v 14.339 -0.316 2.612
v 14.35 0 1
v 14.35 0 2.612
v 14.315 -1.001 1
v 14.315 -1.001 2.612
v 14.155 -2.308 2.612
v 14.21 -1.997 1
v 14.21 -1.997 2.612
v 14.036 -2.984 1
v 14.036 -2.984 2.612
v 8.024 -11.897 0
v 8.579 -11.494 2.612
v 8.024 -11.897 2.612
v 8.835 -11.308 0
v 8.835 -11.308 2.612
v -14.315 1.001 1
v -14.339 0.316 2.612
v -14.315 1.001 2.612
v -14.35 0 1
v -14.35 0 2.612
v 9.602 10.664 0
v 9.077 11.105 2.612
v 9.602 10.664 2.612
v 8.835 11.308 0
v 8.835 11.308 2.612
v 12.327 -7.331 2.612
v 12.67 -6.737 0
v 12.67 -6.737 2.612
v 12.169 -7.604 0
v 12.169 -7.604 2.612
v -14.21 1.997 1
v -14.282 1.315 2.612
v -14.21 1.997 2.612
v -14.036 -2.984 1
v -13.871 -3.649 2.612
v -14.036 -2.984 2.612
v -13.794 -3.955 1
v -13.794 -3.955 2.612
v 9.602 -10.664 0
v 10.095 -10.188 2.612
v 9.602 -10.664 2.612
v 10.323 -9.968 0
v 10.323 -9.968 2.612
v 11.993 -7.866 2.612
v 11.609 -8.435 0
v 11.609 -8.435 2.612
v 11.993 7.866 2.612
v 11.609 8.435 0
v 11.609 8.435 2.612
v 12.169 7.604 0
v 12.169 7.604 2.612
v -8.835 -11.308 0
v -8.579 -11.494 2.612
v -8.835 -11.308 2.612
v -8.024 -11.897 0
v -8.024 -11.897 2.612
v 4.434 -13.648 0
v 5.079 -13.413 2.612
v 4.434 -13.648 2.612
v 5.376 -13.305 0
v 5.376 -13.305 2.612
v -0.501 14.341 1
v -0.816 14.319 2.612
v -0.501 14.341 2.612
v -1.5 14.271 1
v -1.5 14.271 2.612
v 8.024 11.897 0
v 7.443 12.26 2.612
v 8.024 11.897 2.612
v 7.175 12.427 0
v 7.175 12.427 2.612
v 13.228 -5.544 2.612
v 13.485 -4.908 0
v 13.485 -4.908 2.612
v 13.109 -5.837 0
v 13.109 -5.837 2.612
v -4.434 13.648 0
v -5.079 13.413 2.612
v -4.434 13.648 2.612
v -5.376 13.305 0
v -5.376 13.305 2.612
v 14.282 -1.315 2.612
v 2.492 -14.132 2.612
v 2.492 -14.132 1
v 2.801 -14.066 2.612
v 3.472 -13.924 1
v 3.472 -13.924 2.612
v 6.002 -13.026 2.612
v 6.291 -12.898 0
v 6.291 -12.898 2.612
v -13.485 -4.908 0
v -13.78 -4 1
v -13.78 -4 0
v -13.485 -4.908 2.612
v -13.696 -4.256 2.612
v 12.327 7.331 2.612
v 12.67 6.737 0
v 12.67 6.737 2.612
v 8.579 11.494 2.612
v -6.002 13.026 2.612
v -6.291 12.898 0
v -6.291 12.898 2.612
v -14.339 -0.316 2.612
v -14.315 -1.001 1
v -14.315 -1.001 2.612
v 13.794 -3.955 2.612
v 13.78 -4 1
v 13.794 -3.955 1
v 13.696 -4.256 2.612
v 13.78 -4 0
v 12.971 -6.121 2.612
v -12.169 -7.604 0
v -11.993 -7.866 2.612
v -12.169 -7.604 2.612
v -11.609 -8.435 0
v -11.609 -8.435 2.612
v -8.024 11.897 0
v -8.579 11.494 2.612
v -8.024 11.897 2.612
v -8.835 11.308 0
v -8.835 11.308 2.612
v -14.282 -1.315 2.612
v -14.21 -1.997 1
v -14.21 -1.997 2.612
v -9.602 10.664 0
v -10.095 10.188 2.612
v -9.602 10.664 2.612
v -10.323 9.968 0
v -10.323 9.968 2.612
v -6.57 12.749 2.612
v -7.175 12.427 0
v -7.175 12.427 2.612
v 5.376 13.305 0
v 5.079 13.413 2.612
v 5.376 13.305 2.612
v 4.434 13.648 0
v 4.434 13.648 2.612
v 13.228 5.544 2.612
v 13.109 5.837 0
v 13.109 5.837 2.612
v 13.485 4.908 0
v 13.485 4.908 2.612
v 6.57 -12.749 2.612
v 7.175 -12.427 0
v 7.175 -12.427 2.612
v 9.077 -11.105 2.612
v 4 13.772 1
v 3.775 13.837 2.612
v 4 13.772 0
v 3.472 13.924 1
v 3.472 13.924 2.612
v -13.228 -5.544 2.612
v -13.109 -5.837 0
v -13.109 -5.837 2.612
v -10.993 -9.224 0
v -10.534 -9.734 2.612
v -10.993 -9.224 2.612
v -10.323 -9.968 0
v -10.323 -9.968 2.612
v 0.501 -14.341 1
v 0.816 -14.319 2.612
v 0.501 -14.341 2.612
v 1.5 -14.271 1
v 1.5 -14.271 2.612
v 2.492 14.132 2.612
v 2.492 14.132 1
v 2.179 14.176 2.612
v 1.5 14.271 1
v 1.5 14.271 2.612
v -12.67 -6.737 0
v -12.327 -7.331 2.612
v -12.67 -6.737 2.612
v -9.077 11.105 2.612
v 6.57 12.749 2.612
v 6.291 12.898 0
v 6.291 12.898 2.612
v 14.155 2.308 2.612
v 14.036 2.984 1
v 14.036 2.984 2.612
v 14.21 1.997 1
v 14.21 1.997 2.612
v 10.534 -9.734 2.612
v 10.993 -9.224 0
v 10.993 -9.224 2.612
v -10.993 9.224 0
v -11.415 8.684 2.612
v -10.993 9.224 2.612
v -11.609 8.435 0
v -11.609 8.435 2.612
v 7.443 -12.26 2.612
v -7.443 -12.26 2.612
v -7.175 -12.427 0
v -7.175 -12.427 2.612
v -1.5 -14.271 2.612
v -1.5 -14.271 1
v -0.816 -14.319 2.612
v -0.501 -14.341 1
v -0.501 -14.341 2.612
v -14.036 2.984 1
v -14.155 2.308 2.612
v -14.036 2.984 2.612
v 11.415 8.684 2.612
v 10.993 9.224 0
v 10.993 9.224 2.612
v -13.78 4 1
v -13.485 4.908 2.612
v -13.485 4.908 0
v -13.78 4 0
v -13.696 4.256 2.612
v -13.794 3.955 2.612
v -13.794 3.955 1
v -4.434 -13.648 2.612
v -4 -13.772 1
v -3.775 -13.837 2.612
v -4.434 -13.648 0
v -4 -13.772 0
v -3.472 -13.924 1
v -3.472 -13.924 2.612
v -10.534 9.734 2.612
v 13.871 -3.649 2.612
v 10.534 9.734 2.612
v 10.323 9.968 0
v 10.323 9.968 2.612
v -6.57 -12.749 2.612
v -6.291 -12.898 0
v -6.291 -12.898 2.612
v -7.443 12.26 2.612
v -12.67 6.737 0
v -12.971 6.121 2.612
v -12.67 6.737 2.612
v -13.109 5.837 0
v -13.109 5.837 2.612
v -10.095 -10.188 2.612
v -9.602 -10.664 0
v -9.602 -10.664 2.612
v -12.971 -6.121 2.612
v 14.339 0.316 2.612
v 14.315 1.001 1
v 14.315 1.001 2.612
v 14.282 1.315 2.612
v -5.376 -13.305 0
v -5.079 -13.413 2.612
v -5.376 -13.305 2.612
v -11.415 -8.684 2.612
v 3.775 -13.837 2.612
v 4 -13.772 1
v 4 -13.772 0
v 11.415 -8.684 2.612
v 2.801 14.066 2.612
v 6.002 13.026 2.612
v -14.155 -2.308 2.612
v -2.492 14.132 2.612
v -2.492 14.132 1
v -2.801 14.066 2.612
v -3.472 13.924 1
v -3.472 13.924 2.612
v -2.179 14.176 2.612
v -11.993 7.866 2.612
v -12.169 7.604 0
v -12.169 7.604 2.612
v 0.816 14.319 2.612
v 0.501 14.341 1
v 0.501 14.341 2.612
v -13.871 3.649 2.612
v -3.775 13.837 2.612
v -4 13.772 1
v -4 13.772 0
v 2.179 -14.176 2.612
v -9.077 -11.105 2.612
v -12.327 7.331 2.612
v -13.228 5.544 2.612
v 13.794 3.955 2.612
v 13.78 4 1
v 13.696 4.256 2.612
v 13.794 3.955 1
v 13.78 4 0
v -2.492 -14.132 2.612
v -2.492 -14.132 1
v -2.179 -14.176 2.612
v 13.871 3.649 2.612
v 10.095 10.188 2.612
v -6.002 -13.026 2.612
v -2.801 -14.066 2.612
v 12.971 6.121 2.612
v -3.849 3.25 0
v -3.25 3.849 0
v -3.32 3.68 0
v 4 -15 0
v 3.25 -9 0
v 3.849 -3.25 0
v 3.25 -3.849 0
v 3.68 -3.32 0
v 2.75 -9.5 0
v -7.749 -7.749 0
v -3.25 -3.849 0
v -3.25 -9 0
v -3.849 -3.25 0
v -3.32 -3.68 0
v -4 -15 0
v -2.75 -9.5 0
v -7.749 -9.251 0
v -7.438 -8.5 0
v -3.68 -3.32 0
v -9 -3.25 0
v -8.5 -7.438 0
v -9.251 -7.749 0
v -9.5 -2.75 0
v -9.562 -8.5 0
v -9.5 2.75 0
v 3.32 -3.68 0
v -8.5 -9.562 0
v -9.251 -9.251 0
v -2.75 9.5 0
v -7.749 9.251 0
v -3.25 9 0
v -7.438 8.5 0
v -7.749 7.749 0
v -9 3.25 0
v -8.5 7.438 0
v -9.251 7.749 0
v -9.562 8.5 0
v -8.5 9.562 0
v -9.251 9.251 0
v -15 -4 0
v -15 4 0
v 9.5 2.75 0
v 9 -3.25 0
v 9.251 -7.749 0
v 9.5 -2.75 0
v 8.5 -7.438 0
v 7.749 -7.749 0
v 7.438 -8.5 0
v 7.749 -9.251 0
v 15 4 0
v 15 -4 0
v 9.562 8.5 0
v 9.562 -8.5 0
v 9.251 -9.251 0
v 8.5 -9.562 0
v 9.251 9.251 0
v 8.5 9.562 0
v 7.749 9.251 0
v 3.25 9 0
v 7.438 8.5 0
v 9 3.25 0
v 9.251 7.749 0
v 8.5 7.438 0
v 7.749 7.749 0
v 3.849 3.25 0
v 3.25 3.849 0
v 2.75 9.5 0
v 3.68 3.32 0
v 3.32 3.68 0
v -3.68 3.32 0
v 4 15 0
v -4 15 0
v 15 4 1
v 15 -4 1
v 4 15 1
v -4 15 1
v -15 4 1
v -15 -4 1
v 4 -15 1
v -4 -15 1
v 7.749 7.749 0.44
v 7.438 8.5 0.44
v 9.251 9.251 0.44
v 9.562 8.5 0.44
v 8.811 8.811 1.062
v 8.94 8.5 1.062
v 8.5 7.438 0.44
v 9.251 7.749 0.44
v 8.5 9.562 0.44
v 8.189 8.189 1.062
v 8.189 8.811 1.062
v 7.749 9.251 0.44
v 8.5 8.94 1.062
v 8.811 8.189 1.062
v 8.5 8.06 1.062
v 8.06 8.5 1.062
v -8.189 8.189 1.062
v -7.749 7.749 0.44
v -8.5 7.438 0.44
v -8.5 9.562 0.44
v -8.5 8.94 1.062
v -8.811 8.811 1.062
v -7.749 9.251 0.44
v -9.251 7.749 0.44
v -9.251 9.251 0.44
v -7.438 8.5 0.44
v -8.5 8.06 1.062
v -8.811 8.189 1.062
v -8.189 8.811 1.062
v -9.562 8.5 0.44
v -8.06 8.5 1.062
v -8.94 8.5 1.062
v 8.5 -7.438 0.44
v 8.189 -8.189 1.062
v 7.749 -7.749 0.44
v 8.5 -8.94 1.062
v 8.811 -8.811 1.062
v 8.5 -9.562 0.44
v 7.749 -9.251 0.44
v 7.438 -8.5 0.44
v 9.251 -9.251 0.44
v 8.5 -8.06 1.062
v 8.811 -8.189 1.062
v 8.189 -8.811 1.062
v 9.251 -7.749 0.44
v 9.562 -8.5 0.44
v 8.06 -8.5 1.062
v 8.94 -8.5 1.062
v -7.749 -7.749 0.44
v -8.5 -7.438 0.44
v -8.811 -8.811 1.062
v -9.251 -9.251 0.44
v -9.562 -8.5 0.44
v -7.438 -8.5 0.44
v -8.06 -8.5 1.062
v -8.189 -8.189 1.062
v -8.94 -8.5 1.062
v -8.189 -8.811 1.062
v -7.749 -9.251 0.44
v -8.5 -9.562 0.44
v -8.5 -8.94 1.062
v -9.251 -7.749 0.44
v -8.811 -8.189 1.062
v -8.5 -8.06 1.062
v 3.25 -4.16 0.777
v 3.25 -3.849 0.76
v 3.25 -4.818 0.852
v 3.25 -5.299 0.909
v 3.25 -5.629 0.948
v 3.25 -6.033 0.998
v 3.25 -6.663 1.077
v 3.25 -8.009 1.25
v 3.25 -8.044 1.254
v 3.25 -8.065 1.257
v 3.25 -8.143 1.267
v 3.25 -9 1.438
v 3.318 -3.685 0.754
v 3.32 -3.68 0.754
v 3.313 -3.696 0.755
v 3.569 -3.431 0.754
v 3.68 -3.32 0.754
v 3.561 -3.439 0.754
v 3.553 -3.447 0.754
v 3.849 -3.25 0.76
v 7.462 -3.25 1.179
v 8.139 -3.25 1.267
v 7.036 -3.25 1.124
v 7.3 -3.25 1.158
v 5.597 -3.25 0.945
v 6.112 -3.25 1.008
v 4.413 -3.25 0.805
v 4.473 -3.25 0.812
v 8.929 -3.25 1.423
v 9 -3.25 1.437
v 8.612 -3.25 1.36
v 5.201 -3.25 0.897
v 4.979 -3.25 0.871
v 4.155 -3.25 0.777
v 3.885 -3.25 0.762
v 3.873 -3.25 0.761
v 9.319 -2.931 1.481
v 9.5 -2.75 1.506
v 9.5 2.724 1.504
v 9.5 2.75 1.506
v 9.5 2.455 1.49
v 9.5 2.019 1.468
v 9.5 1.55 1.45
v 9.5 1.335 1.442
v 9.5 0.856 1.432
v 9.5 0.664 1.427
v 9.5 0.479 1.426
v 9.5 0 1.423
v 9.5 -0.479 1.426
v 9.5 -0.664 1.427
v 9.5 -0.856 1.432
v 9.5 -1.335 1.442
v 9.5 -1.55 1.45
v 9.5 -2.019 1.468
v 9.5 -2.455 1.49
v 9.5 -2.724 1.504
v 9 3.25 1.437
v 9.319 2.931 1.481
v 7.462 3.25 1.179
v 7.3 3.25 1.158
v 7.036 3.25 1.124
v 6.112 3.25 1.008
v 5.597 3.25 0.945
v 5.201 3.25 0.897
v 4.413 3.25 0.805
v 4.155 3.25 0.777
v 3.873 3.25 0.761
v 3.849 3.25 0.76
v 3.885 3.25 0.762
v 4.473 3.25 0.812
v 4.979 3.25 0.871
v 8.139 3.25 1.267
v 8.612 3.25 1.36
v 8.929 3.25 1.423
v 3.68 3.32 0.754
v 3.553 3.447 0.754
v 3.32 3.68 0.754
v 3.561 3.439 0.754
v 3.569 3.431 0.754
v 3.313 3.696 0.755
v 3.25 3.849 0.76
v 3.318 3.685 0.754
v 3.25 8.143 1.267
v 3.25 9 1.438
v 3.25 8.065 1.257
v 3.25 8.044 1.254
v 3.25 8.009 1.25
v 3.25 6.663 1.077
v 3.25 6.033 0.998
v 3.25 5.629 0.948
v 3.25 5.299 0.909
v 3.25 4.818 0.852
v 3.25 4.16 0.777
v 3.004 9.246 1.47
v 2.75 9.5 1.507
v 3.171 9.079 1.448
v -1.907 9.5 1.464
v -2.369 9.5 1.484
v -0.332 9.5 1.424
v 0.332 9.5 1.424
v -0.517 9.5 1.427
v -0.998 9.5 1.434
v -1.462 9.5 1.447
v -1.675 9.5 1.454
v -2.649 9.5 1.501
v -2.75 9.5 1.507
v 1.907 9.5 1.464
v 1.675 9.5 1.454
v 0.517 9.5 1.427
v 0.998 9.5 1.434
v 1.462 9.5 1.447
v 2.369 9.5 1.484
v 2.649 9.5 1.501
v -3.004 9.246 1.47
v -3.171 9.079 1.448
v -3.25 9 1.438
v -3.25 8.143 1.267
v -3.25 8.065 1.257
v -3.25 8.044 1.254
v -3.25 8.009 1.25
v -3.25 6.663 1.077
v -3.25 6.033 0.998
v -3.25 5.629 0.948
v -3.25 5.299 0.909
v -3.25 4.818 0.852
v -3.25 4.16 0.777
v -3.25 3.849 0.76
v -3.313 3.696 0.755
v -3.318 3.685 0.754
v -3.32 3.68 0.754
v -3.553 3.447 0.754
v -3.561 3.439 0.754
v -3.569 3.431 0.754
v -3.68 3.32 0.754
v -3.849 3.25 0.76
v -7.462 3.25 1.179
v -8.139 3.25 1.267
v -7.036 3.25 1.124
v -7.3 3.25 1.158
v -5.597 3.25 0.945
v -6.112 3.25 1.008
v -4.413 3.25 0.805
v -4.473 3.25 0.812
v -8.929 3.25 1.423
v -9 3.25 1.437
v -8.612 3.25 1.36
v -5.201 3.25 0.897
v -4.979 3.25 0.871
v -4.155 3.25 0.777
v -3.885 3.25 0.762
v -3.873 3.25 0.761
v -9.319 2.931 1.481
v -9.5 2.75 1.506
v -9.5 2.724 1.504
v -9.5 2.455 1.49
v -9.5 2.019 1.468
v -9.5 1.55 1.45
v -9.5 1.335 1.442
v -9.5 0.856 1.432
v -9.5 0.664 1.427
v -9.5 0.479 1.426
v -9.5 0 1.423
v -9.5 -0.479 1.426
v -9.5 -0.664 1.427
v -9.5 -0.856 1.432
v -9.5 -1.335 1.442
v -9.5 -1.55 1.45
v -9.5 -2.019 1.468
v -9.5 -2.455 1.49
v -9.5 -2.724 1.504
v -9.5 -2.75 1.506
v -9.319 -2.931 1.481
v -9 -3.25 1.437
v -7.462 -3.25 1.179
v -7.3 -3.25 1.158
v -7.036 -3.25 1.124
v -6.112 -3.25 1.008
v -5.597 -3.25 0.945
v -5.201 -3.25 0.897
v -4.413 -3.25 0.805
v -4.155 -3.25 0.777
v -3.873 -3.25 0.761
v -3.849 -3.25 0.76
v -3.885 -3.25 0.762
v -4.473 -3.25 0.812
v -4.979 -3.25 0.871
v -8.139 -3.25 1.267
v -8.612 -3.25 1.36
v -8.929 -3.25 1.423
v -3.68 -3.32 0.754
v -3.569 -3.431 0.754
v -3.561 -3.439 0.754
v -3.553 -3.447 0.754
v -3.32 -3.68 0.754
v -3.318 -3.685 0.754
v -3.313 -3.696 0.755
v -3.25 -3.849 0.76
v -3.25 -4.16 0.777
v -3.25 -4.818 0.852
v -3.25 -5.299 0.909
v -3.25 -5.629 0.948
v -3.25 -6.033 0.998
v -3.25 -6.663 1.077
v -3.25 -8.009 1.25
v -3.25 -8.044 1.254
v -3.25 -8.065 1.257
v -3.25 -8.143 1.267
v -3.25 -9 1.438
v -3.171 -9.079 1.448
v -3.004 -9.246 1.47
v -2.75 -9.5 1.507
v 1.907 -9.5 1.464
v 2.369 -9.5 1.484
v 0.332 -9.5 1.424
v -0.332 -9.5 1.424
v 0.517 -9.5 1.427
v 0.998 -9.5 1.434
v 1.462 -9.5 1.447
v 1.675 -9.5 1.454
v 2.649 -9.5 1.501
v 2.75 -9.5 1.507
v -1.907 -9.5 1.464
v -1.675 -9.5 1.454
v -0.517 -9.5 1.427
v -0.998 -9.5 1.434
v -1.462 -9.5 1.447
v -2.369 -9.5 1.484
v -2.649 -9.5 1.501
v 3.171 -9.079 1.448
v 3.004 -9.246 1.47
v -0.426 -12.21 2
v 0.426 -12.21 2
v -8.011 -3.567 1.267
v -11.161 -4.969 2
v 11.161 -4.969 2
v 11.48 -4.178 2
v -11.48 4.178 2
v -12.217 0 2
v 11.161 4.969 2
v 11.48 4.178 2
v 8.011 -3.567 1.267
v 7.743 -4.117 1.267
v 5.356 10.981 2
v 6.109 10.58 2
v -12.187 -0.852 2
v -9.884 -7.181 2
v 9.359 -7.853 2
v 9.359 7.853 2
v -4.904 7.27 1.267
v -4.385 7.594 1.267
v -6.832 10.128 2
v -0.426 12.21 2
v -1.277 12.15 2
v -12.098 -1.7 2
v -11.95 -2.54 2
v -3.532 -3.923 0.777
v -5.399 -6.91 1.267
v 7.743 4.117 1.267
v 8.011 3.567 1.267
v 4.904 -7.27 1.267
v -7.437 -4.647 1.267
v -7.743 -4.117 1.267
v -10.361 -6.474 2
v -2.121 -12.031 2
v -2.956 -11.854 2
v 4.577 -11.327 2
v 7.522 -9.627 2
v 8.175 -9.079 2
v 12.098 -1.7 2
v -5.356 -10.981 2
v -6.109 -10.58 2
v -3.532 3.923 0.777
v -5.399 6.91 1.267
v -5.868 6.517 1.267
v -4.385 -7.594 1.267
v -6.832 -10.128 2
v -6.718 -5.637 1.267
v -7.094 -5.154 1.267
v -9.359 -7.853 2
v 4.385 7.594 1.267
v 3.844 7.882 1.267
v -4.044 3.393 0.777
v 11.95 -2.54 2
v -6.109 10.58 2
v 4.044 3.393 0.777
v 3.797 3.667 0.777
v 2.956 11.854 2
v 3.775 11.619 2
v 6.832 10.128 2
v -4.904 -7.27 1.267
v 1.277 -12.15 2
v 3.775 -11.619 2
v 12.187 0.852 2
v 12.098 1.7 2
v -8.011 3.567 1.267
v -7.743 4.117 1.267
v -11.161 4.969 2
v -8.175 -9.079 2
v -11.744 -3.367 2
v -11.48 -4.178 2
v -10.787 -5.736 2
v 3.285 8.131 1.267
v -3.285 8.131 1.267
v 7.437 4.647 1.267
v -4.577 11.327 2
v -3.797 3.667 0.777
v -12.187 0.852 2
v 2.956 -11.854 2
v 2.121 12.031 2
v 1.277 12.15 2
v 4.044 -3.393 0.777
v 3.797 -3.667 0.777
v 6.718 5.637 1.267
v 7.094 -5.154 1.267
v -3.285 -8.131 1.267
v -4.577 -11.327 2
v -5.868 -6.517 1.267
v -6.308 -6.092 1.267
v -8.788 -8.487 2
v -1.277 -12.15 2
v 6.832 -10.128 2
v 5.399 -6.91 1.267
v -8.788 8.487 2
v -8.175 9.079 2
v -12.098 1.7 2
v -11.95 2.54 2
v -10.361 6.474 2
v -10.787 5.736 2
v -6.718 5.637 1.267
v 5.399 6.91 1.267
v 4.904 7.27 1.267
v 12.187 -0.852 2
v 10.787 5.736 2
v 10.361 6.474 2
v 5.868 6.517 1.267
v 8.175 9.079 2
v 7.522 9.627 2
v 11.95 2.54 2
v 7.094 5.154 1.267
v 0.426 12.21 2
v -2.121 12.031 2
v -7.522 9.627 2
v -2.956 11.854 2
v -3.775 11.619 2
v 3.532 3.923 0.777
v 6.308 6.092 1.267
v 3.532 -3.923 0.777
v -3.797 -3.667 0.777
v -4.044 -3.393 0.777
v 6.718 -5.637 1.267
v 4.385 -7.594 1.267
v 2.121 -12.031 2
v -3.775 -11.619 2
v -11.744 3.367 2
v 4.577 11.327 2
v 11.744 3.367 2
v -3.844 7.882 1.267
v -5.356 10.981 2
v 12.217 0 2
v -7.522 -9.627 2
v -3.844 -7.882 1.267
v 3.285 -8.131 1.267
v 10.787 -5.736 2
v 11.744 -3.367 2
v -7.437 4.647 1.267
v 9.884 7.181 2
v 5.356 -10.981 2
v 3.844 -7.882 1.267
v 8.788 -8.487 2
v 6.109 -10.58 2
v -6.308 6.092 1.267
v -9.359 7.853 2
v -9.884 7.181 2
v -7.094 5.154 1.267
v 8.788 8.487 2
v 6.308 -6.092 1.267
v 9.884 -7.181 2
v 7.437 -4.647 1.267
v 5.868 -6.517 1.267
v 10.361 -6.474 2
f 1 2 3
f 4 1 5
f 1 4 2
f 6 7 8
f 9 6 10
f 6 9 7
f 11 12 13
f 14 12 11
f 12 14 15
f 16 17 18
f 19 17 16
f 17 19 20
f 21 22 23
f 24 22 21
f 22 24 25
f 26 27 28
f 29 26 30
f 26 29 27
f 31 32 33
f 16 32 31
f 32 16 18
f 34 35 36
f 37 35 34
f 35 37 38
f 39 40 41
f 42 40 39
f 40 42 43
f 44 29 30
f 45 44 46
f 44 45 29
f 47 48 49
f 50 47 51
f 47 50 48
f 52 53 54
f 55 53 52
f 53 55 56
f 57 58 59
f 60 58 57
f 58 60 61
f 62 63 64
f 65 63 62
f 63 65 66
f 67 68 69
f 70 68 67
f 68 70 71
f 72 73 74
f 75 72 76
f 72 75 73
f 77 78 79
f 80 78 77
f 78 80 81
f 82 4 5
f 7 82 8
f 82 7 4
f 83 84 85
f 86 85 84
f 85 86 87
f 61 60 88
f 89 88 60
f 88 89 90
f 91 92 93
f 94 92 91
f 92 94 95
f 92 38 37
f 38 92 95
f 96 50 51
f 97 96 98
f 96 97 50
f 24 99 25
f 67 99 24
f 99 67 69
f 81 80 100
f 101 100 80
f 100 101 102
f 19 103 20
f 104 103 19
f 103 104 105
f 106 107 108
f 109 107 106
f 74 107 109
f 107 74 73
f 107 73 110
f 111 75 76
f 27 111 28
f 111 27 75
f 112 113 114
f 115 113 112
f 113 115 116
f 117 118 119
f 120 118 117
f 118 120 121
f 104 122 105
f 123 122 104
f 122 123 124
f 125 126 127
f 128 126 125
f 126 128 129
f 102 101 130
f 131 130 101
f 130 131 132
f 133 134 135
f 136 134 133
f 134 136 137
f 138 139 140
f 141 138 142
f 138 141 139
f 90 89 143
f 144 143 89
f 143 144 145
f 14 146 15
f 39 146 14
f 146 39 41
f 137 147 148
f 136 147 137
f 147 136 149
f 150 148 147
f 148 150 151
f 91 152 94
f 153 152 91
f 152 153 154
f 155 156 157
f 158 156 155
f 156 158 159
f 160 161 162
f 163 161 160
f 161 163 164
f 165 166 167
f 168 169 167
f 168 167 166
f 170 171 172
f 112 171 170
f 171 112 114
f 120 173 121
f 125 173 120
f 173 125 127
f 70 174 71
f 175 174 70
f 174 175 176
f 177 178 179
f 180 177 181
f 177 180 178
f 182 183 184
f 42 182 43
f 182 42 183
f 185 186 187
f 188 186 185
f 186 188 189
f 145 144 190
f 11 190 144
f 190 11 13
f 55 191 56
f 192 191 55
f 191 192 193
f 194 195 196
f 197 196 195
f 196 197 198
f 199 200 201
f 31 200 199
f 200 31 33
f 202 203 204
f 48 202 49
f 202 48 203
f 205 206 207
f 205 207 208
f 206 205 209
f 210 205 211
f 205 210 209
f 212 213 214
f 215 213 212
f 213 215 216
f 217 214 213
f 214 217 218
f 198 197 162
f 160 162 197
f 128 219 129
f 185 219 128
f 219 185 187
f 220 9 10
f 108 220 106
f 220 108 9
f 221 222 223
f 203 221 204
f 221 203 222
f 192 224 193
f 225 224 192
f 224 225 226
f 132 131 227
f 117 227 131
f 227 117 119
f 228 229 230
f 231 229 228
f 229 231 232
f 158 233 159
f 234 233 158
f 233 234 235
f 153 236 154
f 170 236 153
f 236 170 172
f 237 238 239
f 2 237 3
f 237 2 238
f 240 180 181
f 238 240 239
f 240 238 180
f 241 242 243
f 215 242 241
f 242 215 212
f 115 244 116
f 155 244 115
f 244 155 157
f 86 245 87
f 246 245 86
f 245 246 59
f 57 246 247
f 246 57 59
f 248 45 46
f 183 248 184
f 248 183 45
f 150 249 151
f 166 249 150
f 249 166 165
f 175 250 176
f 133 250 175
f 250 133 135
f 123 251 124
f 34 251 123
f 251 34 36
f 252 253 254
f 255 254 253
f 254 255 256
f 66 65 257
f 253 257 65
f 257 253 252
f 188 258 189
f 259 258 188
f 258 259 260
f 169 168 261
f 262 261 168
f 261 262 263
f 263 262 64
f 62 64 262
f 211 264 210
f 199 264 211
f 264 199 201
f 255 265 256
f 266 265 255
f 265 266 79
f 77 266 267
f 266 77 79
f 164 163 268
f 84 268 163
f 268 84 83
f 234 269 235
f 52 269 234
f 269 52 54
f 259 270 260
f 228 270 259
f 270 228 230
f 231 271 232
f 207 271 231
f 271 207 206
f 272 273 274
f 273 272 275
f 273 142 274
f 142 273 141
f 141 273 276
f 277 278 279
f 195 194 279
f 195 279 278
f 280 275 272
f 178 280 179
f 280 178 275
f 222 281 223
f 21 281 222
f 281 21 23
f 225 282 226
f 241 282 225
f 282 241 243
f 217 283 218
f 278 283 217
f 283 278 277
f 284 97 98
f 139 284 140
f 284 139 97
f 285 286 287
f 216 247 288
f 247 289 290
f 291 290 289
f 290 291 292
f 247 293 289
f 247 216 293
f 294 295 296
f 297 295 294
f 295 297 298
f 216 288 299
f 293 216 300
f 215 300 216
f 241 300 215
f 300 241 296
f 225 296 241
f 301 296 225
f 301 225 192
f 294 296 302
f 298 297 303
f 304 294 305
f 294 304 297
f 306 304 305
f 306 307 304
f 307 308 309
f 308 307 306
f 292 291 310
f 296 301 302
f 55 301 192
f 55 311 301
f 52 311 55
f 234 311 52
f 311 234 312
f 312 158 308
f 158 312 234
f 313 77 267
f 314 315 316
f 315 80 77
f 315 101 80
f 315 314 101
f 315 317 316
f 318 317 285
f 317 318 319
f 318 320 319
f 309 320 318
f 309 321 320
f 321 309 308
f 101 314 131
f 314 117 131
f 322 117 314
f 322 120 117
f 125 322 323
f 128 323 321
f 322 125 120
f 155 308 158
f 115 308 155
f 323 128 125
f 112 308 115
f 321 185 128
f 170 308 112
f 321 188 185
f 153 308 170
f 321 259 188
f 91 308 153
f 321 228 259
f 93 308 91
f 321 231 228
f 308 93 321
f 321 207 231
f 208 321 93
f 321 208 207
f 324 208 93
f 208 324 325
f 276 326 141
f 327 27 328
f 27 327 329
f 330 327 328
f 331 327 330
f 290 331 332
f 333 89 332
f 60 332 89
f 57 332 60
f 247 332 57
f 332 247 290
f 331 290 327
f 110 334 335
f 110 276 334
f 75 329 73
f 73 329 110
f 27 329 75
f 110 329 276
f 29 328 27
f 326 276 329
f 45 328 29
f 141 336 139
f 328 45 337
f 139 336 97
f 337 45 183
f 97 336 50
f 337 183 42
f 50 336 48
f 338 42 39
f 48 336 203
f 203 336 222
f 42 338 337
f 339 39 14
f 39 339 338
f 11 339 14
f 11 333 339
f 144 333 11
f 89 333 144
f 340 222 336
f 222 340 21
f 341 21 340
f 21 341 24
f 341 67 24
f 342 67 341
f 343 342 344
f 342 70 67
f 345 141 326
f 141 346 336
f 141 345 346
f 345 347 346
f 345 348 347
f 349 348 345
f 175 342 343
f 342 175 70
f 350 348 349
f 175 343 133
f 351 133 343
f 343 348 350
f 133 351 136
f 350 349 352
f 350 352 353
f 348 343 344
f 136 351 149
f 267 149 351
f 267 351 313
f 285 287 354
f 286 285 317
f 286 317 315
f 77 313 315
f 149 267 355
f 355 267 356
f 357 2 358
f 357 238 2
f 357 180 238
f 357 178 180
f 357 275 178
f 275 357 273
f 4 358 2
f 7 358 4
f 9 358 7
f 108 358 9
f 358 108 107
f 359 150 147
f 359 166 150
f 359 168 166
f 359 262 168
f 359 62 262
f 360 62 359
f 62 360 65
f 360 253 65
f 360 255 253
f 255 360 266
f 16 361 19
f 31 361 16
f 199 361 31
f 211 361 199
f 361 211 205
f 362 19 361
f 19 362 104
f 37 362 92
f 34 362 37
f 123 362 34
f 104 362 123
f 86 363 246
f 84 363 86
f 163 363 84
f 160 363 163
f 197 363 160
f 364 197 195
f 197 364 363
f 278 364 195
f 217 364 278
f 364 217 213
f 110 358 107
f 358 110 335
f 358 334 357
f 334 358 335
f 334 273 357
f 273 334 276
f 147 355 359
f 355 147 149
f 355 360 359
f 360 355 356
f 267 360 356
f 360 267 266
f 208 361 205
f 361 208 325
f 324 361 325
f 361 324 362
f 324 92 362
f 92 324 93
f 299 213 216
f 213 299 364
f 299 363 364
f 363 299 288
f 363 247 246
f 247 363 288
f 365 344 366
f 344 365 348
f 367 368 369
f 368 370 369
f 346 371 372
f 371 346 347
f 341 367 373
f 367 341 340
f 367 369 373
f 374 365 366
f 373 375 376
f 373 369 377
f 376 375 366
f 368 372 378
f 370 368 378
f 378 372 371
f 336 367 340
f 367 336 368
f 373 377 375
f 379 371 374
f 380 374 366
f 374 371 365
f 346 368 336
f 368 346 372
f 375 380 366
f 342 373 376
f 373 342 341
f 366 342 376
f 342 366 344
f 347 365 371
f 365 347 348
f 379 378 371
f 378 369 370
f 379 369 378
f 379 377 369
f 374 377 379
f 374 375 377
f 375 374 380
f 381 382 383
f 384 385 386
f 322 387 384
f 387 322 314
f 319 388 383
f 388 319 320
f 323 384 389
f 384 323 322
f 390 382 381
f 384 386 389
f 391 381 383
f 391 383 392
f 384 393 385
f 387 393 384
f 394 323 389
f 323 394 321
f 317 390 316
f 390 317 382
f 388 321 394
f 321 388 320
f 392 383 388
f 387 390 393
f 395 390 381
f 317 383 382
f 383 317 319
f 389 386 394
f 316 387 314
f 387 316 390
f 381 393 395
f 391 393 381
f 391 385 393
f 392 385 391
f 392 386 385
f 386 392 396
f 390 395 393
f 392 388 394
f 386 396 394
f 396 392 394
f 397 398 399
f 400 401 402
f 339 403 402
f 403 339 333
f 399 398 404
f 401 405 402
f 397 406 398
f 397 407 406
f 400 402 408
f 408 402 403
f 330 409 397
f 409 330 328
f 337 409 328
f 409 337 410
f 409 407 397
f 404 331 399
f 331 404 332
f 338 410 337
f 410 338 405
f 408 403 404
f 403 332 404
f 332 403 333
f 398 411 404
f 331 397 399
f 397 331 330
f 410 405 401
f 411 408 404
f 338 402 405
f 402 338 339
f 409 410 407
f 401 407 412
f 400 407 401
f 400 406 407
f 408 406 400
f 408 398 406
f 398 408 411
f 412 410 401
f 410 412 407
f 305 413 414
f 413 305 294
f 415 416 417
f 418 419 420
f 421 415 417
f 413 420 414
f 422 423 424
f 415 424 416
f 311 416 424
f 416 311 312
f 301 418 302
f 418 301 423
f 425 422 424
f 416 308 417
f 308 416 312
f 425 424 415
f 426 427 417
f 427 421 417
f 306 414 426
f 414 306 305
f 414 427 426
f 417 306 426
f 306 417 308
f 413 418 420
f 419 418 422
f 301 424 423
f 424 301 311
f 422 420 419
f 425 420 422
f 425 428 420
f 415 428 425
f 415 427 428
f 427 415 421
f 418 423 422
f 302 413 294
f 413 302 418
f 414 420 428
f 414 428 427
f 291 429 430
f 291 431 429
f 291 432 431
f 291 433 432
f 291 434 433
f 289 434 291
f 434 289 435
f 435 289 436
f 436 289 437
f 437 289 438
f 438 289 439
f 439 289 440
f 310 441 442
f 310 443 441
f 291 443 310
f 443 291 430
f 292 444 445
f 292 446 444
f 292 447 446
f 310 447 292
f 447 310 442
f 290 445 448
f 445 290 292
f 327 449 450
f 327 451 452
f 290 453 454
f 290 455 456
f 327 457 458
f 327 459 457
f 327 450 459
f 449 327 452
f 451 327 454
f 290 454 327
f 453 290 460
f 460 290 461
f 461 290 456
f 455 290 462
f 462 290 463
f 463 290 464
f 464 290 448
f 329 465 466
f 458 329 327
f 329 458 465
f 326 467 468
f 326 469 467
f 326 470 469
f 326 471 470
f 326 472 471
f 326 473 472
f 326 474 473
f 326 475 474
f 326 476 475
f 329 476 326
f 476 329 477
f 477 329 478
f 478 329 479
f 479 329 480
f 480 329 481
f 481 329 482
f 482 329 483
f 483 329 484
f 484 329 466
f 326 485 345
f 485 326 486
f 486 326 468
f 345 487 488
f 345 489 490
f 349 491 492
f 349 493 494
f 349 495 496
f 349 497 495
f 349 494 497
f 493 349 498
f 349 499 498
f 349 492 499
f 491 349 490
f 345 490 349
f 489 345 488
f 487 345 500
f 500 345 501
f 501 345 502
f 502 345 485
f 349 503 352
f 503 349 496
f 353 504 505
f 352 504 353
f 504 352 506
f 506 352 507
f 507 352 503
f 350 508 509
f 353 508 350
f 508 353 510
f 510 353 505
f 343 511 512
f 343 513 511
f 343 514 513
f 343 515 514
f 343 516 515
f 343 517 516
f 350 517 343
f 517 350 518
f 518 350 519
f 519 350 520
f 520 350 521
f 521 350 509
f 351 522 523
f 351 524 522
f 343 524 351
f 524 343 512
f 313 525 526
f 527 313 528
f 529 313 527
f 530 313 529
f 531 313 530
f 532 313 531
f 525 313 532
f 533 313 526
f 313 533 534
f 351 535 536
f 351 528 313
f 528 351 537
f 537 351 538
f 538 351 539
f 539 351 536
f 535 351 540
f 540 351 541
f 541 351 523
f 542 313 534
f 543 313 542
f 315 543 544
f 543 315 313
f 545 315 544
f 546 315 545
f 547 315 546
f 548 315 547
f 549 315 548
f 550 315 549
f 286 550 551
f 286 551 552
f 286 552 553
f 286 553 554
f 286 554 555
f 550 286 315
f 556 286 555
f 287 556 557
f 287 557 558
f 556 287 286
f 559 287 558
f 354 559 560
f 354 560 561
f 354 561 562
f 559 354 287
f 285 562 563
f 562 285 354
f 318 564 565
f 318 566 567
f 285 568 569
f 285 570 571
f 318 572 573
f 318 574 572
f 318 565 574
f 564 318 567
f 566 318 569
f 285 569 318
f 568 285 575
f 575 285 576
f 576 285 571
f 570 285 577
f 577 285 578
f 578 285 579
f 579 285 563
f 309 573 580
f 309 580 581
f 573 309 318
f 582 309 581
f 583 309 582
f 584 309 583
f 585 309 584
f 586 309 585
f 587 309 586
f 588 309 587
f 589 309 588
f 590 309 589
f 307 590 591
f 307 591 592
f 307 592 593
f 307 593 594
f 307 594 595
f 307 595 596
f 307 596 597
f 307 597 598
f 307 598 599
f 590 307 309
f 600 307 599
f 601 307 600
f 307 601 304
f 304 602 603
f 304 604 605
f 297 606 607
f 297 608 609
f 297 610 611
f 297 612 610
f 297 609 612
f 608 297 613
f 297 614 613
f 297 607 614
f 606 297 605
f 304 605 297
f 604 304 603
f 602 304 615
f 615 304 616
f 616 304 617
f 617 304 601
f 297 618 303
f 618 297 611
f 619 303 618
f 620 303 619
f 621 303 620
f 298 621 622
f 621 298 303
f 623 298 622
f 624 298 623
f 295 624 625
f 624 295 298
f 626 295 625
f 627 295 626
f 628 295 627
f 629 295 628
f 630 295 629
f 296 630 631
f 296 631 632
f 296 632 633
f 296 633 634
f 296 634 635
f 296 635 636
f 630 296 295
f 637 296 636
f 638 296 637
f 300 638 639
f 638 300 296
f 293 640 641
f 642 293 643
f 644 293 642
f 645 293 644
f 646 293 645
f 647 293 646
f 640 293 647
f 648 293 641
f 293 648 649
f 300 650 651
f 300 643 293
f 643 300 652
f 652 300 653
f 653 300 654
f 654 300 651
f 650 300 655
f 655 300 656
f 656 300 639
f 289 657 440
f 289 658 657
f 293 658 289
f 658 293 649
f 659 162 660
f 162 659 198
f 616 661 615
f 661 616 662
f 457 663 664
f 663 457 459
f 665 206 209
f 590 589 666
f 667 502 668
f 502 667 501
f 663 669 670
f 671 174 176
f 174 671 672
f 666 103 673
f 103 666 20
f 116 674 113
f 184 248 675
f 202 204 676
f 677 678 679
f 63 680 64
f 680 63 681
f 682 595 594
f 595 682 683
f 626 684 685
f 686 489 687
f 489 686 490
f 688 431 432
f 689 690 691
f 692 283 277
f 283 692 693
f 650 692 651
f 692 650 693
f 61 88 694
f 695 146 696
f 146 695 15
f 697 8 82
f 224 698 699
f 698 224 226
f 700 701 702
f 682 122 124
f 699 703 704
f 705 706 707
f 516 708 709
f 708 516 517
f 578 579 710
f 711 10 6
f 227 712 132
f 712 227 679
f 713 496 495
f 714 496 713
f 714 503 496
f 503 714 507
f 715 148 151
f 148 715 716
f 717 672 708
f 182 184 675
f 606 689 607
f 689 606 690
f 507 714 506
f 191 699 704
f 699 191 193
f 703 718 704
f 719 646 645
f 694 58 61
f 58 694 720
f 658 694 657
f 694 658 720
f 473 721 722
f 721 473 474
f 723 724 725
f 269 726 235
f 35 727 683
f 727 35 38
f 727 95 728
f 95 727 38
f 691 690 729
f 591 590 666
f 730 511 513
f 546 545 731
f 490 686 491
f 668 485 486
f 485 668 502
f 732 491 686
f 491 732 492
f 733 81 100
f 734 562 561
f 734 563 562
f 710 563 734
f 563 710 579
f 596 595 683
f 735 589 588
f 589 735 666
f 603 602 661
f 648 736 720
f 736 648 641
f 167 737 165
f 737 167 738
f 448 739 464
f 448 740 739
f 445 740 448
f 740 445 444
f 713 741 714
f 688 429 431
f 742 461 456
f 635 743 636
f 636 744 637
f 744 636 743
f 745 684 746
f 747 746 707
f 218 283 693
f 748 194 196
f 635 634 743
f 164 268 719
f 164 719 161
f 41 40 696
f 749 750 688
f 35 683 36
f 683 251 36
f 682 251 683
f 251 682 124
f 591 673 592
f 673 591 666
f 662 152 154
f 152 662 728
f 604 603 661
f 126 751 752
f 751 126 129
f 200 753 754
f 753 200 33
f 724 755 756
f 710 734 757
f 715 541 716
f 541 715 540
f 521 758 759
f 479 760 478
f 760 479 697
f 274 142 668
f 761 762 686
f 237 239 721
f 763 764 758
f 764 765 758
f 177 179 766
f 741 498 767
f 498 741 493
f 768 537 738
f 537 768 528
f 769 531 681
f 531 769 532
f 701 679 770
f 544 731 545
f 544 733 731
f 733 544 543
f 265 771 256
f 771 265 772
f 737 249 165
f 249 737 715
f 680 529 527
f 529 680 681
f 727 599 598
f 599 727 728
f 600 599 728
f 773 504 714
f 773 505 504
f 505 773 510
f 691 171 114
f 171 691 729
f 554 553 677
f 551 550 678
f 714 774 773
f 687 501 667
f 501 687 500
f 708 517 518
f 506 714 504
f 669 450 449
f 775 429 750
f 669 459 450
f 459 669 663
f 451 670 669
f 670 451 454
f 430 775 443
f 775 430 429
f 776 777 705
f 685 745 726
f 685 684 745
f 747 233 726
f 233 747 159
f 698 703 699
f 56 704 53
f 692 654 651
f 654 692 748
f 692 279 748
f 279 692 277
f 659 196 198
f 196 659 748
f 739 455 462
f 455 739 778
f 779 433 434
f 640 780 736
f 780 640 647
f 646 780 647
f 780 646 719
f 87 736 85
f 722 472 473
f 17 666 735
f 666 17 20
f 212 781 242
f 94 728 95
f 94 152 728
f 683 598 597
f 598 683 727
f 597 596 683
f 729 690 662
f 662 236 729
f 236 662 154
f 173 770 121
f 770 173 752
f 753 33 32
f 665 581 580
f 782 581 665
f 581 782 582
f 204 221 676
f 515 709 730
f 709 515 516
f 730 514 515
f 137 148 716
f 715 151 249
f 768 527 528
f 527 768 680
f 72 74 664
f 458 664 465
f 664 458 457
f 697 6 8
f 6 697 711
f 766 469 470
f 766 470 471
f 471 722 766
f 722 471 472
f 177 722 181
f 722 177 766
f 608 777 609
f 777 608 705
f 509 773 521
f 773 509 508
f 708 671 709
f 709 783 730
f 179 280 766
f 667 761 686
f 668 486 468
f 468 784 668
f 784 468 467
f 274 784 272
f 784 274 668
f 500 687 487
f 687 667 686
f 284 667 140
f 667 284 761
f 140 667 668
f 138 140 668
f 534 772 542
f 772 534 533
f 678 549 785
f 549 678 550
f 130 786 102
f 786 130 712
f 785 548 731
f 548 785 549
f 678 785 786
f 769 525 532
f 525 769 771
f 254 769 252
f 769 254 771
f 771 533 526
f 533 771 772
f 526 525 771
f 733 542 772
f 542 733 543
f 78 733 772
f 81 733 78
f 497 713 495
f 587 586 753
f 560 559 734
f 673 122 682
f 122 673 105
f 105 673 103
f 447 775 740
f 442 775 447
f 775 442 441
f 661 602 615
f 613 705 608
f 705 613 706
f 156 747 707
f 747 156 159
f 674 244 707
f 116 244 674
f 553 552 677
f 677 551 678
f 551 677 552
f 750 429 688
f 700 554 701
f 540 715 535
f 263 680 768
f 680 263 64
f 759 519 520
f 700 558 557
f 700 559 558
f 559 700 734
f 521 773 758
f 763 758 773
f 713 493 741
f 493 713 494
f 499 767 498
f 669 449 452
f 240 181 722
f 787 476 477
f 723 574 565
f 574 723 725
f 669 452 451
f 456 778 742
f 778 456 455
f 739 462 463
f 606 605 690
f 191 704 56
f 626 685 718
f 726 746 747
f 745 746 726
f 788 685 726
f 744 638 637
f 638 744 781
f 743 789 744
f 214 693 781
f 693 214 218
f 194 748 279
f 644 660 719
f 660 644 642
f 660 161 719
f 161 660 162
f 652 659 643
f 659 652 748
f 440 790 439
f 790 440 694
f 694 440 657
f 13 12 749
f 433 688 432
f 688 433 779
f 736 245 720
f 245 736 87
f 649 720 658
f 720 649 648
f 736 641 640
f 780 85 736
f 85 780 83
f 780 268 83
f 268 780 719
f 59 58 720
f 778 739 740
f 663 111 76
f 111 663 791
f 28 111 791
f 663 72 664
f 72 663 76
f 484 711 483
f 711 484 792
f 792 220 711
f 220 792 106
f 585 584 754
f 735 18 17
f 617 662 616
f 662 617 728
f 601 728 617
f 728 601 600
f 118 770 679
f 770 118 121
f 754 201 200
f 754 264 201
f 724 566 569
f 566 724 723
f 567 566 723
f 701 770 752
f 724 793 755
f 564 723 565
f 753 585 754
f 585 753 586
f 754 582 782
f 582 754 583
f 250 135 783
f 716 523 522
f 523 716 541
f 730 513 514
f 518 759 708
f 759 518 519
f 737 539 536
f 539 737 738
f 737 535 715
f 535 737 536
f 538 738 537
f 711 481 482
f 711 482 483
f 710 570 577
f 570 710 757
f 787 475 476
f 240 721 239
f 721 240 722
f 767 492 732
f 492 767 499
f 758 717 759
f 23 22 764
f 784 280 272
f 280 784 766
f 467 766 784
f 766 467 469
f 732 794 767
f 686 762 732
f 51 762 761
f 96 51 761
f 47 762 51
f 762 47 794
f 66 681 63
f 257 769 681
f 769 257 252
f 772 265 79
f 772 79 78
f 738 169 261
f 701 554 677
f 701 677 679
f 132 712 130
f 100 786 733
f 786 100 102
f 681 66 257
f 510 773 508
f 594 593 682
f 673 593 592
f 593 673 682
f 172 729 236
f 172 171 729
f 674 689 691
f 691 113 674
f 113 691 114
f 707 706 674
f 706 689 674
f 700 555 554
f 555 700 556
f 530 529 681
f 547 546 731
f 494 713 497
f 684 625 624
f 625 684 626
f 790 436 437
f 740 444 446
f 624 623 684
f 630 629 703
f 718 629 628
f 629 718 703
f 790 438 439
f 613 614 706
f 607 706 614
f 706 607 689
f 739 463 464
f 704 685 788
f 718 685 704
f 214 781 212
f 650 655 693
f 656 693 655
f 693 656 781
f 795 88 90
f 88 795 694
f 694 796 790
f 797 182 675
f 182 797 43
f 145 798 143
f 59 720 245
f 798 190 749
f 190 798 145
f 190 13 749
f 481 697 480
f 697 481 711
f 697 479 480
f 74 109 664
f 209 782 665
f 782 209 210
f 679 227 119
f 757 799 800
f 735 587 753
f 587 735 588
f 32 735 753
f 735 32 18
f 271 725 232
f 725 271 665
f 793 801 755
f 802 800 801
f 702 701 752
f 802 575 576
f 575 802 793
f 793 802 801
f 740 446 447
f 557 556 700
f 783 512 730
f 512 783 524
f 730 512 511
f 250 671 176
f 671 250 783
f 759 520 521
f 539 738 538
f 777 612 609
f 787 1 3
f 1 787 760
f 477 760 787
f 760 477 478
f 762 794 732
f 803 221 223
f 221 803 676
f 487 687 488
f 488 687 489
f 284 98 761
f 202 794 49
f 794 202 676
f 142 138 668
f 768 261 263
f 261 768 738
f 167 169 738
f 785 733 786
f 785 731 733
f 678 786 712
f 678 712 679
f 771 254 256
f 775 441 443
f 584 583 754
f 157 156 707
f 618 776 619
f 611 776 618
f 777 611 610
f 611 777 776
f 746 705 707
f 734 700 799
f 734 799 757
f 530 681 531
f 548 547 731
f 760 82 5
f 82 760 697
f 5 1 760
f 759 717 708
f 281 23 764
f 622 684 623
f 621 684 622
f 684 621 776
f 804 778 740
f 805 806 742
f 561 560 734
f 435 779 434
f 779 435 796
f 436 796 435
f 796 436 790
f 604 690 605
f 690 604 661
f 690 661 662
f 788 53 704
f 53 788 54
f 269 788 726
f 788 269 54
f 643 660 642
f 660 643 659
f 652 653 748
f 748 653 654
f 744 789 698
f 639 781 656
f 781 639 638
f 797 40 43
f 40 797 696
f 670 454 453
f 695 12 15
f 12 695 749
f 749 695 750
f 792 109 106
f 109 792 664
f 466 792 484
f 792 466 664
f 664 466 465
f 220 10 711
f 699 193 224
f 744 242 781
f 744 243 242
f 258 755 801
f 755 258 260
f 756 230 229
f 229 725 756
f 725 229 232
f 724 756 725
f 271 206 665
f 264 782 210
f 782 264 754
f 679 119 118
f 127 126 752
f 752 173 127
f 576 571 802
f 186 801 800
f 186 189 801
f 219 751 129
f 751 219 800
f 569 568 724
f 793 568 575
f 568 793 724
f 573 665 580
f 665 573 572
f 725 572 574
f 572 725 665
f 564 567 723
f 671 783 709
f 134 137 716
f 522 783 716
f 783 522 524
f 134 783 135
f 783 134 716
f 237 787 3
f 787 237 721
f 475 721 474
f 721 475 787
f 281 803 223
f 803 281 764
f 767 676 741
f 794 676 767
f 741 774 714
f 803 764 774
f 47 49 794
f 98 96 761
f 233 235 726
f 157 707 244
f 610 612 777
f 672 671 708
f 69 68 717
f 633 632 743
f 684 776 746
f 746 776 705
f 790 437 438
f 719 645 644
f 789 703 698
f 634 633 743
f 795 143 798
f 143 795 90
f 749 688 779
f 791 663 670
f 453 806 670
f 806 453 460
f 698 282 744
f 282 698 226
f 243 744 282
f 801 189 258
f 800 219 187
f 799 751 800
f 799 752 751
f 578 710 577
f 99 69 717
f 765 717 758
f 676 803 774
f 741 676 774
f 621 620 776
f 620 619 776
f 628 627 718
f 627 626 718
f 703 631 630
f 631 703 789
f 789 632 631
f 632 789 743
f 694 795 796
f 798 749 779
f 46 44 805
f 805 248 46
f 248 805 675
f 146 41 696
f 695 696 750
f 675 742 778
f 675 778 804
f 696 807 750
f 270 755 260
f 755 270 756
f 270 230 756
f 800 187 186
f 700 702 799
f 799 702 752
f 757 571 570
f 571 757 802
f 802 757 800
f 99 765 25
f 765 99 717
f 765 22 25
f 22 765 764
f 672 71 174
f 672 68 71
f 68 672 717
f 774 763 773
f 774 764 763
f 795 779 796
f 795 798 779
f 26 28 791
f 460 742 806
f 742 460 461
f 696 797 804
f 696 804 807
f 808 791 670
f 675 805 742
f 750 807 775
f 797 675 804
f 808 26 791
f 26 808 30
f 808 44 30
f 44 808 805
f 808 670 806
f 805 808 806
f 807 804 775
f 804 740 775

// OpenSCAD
// file: controls.scad
// Copyright 2019 a.j.buxton@gmail.com
// CC BY-NC-ND 4.0

module dpad() {
    offset(r=0.5) offset(r=-0.5) offset(r=-0.5) offset(r=0.5) union() {
        square([6.5, 19], center=true);
        square([19, 6.5], center=true);
    }
}

module btn() {
    translate([0, 15.5/2]) rotate(270) children(); //circle(d=8.1);
    translate([0, -15.5/2]) rotate(90) children();

    translate([16/2, 0]) rotate(180) children();
    translate([-16/2, 0]) rotate(0) children();

}

module smlbtn() {
    translate([9.5/2, 0]) children(); //circle(d=5.2);
    translate([-9.5/2, 0]) children();

}

module analog() {
    circle(d=15);
}
// main file
// Copyright 2019 a.j.buxton@gmail.com
// CC BY-NC-ND 4.0

include <controls.scad>;

RES = is_undef(RES) ? 2 : RES;

$fa = 8/RES; $fs = 2/RES;

module twobytwo() {
    children();
    mirror([1, 0]) children();
    mirror([0, 1]) children();
    mirror([1, 0]) mirror([0, 1]) children();
}

module dpad_c() {
    difference() {
        union() {
            linear_extrude(height=3, convexity=10) circle(d=28.7);
            linear_extrude(height=1, convexity=10) {
                square([8, 30], center=true);
                square([30, 8], center=true);
            }
        }
        twobytwo() translate([8.5, 8.5, 0]) sphere(d=2.3);
        translate([0, 0, -1]) linear_extrude(height=10, convexity=10) dpad();
        translate([0, 0, 51]) sphere(r=50.5);
    }


}


dpad_c();

//8.65x18.65
